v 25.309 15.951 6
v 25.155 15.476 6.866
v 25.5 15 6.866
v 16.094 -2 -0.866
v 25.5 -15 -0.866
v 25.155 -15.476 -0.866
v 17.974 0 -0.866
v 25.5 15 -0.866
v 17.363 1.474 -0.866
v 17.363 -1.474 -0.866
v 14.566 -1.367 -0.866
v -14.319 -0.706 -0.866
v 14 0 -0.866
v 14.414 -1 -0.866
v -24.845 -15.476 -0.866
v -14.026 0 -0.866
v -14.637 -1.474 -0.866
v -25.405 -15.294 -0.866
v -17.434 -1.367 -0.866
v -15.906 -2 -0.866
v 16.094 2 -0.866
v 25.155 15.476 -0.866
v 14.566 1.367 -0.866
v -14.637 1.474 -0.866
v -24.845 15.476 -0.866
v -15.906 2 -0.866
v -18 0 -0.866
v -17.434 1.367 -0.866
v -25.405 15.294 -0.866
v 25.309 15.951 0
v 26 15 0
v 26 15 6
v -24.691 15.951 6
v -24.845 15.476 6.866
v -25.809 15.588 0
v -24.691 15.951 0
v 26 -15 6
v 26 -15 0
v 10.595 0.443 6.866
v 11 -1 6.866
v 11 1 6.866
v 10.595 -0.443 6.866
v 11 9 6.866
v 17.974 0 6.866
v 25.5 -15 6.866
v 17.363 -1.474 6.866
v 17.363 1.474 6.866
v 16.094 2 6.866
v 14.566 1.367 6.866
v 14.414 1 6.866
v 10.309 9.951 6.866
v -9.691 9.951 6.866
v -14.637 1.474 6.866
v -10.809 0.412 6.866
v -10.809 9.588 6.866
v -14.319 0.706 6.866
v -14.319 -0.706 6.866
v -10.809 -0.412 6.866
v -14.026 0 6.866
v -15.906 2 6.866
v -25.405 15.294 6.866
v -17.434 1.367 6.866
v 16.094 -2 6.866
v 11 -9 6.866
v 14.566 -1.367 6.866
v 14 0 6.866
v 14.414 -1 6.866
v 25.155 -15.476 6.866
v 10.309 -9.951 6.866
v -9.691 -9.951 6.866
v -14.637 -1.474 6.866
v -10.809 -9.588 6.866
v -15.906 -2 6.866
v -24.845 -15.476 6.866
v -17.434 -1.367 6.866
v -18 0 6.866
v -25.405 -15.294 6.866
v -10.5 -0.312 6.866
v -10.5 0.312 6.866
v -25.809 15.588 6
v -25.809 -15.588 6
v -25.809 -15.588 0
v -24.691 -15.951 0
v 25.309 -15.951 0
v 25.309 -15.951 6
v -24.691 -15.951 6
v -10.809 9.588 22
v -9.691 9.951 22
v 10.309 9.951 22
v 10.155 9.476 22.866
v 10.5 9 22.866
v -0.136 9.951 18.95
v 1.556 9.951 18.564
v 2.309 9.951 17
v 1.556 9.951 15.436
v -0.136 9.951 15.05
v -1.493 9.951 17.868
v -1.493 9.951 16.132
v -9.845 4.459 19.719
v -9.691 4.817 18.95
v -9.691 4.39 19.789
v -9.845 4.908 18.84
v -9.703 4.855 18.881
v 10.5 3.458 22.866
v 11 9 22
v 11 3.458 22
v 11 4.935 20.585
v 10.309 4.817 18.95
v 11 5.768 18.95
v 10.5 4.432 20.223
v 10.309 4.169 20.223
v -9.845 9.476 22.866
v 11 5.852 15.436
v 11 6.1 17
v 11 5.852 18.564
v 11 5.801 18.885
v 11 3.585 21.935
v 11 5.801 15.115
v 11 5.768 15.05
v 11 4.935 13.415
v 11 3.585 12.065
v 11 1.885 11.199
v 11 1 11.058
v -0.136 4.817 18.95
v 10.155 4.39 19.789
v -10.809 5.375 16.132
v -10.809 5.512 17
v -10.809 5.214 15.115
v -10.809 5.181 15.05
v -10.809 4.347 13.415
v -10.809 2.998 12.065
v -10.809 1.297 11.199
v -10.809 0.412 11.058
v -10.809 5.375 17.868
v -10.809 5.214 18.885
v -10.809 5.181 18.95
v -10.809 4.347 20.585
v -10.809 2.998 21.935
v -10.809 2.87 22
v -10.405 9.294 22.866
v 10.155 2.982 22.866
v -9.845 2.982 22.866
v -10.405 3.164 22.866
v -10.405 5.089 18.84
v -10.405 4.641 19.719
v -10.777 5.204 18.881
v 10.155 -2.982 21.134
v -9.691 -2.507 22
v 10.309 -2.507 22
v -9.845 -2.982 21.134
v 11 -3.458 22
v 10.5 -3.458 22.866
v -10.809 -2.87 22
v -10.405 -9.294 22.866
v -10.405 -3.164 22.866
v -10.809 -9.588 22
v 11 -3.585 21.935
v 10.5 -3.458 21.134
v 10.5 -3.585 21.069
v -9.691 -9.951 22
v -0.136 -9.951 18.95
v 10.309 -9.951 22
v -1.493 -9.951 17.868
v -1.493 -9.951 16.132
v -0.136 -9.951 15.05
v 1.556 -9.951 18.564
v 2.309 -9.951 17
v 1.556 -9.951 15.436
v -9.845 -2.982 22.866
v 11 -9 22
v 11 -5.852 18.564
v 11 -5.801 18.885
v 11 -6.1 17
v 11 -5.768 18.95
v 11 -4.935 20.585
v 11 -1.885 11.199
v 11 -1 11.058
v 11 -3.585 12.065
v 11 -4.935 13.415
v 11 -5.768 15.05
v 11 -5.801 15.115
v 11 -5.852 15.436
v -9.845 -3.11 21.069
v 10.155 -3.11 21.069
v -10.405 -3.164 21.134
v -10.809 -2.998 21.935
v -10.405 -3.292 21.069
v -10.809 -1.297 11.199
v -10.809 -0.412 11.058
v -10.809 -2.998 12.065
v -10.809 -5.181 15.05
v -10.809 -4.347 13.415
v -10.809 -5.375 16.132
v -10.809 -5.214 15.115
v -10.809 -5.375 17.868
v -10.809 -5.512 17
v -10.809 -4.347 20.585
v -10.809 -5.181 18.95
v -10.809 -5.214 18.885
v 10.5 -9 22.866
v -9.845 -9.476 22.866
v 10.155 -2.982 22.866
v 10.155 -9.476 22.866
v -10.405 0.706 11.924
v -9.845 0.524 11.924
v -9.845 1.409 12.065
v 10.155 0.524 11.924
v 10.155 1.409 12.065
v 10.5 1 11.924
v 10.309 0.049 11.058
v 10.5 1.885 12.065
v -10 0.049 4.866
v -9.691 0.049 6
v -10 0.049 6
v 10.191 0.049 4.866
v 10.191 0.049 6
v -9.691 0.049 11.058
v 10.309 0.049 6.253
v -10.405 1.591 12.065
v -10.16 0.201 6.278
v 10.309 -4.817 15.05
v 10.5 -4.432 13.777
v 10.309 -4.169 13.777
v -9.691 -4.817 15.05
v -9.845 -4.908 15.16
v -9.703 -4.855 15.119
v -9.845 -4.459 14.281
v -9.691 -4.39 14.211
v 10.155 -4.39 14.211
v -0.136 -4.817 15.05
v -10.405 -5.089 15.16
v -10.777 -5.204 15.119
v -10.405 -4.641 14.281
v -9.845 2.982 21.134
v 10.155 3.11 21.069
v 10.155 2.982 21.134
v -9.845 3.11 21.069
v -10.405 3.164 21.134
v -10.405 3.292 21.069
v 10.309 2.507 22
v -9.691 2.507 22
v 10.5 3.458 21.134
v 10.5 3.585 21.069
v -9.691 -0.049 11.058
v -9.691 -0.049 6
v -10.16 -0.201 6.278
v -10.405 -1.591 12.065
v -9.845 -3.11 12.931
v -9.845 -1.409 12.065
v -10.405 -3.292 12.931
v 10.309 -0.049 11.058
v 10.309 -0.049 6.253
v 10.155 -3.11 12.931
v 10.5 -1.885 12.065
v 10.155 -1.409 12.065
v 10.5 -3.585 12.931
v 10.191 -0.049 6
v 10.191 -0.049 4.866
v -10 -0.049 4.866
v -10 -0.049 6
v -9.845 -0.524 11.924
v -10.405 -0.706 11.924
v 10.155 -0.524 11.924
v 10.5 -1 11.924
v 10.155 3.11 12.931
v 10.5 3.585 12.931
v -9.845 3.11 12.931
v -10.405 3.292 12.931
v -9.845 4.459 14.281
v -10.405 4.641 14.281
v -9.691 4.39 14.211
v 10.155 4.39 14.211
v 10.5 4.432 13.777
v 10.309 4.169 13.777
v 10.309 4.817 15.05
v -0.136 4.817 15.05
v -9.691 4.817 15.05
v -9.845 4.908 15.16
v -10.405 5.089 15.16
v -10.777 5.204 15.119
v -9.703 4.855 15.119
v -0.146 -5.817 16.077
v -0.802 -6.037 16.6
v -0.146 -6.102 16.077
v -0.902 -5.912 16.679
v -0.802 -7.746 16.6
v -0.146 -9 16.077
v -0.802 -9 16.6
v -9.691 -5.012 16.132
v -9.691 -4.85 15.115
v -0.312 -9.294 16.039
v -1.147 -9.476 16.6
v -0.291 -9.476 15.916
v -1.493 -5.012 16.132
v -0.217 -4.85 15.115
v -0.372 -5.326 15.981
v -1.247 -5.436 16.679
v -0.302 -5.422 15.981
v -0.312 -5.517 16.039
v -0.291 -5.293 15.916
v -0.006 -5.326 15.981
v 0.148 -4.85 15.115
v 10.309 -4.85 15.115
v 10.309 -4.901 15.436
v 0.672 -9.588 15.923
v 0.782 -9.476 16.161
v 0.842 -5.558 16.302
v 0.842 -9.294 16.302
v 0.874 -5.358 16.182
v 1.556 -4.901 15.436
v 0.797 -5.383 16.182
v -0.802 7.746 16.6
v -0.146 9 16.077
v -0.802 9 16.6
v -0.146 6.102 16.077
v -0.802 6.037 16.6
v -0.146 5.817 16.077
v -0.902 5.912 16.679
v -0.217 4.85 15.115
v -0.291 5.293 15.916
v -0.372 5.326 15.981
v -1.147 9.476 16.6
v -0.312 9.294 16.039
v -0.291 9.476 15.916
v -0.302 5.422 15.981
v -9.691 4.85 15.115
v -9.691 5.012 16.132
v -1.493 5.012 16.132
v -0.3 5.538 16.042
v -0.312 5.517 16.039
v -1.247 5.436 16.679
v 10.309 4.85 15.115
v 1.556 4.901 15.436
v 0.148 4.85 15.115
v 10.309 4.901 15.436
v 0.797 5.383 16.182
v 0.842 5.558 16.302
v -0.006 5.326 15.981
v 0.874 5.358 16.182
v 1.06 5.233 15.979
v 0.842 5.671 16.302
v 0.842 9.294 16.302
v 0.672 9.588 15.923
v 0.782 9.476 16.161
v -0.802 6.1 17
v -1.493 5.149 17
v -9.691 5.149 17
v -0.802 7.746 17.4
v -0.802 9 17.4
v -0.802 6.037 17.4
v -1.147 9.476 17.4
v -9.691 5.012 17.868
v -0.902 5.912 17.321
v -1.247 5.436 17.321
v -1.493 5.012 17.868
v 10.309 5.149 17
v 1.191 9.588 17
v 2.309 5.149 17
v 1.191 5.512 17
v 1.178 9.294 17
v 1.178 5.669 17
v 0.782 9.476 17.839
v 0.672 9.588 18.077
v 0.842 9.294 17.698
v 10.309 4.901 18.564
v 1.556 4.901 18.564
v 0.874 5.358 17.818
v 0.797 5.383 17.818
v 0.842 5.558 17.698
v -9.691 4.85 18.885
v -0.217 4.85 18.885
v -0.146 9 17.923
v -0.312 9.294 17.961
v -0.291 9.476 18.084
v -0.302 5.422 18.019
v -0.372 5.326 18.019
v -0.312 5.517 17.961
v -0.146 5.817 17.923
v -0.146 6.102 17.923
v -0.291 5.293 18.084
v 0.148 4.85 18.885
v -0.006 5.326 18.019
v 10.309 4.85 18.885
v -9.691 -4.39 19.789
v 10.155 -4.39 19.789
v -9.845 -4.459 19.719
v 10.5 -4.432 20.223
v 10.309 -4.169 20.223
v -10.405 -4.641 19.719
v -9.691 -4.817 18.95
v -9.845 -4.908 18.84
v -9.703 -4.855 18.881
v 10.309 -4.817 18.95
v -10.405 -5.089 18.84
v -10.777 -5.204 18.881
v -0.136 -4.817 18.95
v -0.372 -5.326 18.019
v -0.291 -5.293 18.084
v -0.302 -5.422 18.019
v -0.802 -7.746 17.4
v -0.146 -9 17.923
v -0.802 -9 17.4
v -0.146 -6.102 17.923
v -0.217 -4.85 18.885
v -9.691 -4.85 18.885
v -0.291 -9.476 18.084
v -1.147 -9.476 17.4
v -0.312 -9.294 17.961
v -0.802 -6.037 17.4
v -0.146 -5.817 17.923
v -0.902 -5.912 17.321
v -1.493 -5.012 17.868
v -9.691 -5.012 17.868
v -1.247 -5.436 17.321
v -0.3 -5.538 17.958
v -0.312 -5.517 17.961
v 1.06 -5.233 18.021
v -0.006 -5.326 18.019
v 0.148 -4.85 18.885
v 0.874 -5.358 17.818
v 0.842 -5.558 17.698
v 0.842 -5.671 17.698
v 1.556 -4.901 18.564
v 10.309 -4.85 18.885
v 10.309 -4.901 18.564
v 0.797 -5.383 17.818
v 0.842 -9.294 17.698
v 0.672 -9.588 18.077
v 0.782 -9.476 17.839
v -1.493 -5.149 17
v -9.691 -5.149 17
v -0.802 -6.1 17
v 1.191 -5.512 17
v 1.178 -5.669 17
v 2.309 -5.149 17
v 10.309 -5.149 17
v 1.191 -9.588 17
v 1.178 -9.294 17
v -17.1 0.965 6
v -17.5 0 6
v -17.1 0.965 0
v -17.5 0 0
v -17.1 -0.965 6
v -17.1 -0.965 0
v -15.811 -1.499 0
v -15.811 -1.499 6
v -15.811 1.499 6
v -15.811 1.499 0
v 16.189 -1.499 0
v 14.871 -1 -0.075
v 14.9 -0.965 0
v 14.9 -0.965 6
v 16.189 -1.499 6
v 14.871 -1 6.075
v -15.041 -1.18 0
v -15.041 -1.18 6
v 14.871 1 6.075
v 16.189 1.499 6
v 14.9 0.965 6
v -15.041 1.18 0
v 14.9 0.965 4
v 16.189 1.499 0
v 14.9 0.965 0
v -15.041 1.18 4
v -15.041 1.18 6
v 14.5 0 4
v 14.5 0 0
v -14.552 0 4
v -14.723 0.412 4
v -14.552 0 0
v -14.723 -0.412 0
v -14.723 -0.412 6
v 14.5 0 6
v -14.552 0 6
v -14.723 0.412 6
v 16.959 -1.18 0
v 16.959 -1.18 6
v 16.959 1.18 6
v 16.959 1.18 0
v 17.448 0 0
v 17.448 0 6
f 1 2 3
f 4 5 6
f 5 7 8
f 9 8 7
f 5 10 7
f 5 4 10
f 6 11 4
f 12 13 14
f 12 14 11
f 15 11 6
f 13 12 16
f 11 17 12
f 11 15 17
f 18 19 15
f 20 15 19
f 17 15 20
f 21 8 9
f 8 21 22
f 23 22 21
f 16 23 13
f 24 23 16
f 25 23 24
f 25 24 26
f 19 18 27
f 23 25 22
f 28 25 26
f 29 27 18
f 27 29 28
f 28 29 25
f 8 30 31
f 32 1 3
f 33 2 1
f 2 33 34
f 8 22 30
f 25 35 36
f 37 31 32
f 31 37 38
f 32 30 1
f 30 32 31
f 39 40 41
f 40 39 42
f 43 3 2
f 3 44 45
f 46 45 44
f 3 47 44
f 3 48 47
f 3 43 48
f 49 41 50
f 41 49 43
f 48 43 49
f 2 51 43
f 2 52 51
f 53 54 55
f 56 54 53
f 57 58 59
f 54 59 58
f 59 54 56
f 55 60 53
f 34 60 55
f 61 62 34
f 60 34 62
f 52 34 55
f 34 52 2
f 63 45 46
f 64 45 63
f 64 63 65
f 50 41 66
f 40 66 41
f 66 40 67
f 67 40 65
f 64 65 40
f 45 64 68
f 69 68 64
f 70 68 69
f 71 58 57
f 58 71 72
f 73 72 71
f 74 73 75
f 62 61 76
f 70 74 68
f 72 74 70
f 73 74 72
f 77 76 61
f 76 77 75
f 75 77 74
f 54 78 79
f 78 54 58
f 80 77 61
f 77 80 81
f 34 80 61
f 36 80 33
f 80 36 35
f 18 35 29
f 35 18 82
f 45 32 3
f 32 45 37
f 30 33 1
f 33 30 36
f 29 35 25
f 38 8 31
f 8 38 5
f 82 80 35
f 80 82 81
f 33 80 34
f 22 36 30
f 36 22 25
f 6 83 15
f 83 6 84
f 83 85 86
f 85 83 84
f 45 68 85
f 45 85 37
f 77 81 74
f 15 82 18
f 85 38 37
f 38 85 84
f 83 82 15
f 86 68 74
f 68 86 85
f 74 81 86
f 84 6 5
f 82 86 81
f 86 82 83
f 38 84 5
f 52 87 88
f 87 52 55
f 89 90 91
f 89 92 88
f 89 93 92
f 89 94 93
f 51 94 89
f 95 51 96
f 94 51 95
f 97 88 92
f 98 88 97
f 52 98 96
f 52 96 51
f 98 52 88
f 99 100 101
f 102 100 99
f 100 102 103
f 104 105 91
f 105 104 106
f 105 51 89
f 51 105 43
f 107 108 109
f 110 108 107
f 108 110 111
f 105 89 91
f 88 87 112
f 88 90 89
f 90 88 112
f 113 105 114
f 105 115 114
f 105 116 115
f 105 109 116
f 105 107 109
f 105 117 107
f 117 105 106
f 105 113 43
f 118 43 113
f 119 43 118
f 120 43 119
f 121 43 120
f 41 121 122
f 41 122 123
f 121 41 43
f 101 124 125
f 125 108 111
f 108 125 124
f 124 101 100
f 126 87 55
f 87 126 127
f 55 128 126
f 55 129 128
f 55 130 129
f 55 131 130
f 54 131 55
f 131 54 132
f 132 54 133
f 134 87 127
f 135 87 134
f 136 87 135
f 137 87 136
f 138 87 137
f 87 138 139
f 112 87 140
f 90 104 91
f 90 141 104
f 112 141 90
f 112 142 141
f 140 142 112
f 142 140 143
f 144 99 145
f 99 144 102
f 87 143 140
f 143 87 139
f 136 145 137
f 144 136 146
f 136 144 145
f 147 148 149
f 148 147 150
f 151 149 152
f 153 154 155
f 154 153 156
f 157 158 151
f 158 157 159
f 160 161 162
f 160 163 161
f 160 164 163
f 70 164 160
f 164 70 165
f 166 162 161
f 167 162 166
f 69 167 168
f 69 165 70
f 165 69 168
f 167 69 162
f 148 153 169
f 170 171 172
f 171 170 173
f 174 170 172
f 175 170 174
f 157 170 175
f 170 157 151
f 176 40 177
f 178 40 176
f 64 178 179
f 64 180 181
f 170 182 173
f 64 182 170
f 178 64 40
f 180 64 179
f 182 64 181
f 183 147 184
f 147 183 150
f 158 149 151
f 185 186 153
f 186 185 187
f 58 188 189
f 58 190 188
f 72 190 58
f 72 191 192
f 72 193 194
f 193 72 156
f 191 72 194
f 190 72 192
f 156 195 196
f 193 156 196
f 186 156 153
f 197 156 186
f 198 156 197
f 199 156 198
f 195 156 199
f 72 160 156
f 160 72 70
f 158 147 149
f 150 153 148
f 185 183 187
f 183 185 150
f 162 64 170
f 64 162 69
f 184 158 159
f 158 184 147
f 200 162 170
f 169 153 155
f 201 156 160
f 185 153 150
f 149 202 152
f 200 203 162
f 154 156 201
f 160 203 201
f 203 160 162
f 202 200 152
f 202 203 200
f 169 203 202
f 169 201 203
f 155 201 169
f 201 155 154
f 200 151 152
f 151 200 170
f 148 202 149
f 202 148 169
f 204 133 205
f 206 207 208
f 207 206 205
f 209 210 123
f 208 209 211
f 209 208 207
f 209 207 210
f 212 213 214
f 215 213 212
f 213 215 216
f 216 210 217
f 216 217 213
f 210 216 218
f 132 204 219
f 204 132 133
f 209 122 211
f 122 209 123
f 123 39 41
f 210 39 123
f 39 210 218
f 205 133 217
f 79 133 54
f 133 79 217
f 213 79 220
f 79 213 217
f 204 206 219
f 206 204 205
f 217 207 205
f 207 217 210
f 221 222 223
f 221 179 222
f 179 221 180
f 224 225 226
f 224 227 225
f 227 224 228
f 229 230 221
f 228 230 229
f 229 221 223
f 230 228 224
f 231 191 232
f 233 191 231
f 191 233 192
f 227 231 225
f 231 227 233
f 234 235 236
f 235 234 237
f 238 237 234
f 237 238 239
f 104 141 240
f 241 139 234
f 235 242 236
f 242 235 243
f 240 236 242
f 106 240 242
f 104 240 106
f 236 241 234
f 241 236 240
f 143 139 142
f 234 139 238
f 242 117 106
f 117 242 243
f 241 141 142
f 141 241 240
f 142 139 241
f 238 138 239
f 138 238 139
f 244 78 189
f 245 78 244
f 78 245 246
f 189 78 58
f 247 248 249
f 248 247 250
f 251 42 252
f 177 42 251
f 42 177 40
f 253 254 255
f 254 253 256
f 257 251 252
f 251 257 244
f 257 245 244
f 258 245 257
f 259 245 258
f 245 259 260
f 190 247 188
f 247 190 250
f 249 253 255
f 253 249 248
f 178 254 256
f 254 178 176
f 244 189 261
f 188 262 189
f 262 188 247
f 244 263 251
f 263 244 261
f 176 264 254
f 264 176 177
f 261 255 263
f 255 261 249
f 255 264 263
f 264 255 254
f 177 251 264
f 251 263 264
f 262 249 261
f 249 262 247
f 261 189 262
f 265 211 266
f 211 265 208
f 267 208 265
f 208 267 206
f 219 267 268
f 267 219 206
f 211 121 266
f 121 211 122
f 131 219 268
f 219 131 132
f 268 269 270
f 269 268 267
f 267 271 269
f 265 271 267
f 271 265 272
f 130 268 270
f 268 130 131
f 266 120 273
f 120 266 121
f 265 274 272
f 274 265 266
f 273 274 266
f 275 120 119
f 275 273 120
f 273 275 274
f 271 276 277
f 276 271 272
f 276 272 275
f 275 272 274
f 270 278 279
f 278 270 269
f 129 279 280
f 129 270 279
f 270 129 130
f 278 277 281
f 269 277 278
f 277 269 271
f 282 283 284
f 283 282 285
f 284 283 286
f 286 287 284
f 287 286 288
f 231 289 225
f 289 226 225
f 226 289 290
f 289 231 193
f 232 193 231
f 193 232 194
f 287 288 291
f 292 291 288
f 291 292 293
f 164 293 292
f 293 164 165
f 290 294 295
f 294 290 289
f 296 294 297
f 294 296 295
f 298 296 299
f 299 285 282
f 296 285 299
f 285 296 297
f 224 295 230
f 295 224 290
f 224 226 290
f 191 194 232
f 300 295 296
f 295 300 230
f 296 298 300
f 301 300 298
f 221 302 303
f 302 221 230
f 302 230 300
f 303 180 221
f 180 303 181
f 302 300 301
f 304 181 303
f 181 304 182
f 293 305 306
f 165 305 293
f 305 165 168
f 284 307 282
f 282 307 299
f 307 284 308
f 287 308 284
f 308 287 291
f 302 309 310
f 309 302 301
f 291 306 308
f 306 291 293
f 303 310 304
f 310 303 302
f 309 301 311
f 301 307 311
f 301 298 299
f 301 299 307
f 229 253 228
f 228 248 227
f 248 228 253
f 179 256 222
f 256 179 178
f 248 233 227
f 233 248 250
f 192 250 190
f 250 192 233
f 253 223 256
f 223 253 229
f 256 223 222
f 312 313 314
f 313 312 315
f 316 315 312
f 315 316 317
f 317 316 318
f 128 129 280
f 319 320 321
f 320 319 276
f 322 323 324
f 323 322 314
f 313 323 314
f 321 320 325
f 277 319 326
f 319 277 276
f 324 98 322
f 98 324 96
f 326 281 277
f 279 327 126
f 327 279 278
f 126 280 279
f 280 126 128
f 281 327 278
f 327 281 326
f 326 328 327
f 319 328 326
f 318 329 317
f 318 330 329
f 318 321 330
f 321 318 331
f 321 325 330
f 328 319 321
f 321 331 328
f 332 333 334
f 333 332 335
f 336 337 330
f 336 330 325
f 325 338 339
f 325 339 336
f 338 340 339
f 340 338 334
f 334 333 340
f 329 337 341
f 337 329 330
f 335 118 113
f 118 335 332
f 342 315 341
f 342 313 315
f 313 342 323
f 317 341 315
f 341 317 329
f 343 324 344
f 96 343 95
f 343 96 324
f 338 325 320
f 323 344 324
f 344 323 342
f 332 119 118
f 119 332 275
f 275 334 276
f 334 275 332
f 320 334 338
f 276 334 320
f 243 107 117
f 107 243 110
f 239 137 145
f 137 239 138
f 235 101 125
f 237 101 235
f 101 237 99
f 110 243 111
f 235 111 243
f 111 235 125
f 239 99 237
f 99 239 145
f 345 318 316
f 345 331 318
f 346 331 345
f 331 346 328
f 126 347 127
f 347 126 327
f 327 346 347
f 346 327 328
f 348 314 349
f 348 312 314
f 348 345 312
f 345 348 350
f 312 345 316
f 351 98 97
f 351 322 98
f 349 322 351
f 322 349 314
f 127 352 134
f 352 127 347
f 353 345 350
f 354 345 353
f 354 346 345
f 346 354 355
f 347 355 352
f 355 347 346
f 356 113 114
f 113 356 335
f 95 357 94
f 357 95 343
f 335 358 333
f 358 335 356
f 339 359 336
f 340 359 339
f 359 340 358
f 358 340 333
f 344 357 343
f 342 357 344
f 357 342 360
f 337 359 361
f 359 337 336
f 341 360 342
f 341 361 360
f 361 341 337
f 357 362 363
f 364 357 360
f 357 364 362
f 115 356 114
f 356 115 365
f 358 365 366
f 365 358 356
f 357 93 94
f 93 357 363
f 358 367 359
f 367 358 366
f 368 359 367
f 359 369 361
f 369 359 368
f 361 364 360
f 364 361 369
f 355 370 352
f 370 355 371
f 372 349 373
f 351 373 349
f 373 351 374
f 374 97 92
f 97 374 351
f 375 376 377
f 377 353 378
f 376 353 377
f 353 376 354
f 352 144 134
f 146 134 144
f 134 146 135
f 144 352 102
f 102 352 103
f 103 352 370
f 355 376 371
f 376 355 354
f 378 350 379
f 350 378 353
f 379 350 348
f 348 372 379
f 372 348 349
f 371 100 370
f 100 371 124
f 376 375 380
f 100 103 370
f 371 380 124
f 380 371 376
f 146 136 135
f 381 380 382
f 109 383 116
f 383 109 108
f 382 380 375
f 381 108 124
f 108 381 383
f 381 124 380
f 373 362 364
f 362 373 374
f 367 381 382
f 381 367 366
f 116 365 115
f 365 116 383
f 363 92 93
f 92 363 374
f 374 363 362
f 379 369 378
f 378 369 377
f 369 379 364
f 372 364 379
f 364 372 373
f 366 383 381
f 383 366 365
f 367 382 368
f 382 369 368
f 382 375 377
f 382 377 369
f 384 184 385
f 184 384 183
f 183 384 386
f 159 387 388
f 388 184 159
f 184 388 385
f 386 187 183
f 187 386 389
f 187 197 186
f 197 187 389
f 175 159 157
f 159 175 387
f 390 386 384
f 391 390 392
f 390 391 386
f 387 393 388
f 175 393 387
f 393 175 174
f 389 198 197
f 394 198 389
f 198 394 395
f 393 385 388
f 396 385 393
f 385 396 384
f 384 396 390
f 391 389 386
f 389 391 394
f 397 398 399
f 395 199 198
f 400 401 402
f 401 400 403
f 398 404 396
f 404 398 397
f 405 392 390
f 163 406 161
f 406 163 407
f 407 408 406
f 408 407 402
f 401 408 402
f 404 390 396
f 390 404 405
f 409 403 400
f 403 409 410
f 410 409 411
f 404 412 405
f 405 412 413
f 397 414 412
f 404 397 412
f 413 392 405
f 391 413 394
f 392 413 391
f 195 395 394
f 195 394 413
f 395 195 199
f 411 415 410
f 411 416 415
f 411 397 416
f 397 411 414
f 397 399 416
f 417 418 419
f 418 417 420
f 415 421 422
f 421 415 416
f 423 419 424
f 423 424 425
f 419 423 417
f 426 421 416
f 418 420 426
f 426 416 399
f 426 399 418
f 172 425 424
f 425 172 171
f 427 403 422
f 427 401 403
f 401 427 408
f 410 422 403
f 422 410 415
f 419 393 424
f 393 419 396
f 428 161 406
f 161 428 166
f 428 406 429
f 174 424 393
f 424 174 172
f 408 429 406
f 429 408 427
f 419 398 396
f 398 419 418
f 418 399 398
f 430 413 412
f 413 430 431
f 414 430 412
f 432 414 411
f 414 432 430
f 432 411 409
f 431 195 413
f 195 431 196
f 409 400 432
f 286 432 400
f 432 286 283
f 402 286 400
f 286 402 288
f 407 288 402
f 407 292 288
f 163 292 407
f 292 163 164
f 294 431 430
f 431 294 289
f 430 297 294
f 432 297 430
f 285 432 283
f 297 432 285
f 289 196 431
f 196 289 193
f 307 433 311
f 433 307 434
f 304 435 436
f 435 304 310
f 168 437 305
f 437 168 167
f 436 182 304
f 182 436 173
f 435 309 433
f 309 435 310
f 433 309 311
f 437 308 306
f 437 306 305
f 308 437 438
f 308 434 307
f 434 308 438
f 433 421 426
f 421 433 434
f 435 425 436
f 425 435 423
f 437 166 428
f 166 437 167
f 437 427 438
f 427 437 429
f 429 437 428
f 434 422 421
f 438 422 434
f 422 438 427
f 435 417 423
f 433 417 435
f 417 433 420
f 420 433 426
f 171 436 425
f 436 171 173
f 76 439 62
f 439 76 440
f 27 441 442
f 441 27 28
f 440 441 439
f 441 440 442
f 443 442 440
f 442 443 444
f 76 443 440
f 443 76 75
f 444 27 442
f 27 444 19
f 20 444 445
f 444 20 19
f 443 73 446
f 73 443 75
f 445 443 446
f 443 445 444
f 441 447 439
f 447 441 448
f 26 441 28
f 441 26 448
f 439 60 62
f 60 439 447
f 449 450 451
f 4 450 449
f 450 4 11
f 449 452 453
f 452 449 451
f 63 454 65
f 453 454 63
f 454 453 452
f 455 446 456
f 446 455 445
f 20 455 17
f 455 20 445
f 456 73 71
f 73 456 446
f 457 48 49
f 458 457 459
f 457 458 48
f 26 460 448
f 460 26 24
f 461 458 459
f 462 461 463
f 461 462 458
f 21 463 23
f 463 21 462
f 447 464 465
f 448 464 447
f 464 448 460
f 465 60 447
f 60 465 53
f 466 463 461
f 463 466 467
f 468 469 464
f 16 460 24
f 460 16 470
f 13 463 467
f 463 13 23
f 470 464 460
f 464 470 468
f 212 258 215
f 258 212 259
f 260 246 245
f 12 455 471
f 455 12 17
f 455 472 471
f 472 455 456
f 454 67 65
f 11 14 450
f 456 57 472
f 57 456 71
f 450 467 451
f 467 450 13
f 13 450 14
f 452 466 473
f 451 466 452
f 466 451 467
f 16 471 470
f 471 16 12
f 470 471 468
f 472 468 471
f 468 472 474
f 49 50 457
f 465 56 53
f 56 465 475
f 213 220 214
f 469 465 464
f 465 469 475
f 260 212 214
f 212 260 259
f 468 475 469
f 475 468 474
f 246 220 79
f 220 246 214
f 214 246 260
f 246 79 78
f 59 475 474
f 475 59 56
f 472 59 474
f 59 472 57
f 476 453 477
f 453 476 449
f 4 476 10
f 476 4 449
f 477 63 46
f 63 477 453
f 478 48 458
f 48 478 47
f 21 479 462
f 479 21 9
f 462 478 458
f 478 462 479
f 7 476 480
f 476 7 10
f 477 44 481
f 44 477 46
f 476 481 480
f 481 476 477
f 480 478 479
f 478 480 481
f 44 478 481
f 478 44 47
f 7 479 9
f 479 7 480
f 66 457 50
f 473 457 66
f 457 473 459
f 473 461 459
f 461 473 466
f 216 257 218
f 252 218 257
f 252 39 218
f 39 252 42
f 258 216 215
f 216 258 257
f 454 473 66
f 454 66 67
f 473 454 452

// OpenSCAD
// Parameters
rod_d = 12.0; //[6.0:24.0:0.1]
bracket_h = 23.0; //[12.0:46.0:0.5]
base_L = 50.0; //[25.0:100.0:1]
base_W = 30.0; //[15.0:60.0:1]
base_t = 6.0; //[3.0:12.0:0.5]
support_W = 18.0; //[9.0:36.0:0.5]
support_L = 20.0; //[10.0:40.0:0.5]
bore_d = 12.2; //[6.2:24.6:0.05]
bore_center_h = 17.0; //[10.0:34.0:0.5]
mount_hole_d = 5.0; //[3.0:10.0:0.1]
mount_hole_spacing = 32.0; //[16.0:64.0:1]
mount_hole_edge_offset = 9.0; //[5.0:18.0:0.5]
set_screw_d = 4.0; //[2.0:8.0:0.1]
set_screw_z = 17.0; //[10.0:34.0:0.5]
clamp_slot_w = 2.0; //[1.0:4.0:0.1]
overlap = 1.0; //[0.5:2.0:0.1]
fillet_r = 1.0; //[0.5:3.0:0.1]

// Base block
module base_block() {
  translate([0, 0, base_t/2])
    cube([base_L, base_W, base_t], center=true);
}

// Rod bore support body
module rod_bore_support_body() {
  translate([0, 0, base_t + (bracket_h - base_t)/2 - overlap])
    cube([support_L, support_W, bracket_h - base_t], center=true);
}

// Rod bore
module rod_bore() {
  translate([0, 0, bore_center_h])
    rotate([0, 90, 0])
      cylinder(h=support_L + 2*overlap, r=bore_d/2, center=true);
}

// Mounting holes
module mount_hole_1() {
  translate([-mount_hole_spacing/2, 0, base_t/2])
    cylinder(h=base_t + 2*overlap, r=mount_hole_d/2, center=true);
}

module mount_hole_2() {
  translate([mount_hole_spacing/2, 0, base_t/2])
    cylinder(h=base_t + 2*overlap, r=mount_hole_d/2, center=true);
}

// Set screw hole
module set_screw_hole() {
  translate([0, 0, set_screw_z])
    rotate([90, 0, 0])
      cylinder(h=support_W + 2*overlap, r=set_screw_d/2, center=true);
}

// Split clamp slot
module split_clamp_slot() {
  translate([0, 0, base_t + (bracket_h - base_t)/2 - overlap])
    cube([support_L + 2*overlap, clamp_slot_w, bracket_h - base_t + 2*overlap], center=true);
}

// Fillet sphere
module fillet_sphere() {
  sphere(r=fillet_r, center=true);
}

// Assemble the bracket
module shaft_support_bracket() {
  difference() {
    union() {
      base_block();
      rod_bore_support_body();
    }
    rod_bore();
    mount_hole_1();
    mount_hole_2();
    set_screw_hole();
    split_clamp_slot();
  }
}

// Apply fillets and chamfers
minkowski() {
  shaft_support_bracket();
  fillet_sphere();
}
